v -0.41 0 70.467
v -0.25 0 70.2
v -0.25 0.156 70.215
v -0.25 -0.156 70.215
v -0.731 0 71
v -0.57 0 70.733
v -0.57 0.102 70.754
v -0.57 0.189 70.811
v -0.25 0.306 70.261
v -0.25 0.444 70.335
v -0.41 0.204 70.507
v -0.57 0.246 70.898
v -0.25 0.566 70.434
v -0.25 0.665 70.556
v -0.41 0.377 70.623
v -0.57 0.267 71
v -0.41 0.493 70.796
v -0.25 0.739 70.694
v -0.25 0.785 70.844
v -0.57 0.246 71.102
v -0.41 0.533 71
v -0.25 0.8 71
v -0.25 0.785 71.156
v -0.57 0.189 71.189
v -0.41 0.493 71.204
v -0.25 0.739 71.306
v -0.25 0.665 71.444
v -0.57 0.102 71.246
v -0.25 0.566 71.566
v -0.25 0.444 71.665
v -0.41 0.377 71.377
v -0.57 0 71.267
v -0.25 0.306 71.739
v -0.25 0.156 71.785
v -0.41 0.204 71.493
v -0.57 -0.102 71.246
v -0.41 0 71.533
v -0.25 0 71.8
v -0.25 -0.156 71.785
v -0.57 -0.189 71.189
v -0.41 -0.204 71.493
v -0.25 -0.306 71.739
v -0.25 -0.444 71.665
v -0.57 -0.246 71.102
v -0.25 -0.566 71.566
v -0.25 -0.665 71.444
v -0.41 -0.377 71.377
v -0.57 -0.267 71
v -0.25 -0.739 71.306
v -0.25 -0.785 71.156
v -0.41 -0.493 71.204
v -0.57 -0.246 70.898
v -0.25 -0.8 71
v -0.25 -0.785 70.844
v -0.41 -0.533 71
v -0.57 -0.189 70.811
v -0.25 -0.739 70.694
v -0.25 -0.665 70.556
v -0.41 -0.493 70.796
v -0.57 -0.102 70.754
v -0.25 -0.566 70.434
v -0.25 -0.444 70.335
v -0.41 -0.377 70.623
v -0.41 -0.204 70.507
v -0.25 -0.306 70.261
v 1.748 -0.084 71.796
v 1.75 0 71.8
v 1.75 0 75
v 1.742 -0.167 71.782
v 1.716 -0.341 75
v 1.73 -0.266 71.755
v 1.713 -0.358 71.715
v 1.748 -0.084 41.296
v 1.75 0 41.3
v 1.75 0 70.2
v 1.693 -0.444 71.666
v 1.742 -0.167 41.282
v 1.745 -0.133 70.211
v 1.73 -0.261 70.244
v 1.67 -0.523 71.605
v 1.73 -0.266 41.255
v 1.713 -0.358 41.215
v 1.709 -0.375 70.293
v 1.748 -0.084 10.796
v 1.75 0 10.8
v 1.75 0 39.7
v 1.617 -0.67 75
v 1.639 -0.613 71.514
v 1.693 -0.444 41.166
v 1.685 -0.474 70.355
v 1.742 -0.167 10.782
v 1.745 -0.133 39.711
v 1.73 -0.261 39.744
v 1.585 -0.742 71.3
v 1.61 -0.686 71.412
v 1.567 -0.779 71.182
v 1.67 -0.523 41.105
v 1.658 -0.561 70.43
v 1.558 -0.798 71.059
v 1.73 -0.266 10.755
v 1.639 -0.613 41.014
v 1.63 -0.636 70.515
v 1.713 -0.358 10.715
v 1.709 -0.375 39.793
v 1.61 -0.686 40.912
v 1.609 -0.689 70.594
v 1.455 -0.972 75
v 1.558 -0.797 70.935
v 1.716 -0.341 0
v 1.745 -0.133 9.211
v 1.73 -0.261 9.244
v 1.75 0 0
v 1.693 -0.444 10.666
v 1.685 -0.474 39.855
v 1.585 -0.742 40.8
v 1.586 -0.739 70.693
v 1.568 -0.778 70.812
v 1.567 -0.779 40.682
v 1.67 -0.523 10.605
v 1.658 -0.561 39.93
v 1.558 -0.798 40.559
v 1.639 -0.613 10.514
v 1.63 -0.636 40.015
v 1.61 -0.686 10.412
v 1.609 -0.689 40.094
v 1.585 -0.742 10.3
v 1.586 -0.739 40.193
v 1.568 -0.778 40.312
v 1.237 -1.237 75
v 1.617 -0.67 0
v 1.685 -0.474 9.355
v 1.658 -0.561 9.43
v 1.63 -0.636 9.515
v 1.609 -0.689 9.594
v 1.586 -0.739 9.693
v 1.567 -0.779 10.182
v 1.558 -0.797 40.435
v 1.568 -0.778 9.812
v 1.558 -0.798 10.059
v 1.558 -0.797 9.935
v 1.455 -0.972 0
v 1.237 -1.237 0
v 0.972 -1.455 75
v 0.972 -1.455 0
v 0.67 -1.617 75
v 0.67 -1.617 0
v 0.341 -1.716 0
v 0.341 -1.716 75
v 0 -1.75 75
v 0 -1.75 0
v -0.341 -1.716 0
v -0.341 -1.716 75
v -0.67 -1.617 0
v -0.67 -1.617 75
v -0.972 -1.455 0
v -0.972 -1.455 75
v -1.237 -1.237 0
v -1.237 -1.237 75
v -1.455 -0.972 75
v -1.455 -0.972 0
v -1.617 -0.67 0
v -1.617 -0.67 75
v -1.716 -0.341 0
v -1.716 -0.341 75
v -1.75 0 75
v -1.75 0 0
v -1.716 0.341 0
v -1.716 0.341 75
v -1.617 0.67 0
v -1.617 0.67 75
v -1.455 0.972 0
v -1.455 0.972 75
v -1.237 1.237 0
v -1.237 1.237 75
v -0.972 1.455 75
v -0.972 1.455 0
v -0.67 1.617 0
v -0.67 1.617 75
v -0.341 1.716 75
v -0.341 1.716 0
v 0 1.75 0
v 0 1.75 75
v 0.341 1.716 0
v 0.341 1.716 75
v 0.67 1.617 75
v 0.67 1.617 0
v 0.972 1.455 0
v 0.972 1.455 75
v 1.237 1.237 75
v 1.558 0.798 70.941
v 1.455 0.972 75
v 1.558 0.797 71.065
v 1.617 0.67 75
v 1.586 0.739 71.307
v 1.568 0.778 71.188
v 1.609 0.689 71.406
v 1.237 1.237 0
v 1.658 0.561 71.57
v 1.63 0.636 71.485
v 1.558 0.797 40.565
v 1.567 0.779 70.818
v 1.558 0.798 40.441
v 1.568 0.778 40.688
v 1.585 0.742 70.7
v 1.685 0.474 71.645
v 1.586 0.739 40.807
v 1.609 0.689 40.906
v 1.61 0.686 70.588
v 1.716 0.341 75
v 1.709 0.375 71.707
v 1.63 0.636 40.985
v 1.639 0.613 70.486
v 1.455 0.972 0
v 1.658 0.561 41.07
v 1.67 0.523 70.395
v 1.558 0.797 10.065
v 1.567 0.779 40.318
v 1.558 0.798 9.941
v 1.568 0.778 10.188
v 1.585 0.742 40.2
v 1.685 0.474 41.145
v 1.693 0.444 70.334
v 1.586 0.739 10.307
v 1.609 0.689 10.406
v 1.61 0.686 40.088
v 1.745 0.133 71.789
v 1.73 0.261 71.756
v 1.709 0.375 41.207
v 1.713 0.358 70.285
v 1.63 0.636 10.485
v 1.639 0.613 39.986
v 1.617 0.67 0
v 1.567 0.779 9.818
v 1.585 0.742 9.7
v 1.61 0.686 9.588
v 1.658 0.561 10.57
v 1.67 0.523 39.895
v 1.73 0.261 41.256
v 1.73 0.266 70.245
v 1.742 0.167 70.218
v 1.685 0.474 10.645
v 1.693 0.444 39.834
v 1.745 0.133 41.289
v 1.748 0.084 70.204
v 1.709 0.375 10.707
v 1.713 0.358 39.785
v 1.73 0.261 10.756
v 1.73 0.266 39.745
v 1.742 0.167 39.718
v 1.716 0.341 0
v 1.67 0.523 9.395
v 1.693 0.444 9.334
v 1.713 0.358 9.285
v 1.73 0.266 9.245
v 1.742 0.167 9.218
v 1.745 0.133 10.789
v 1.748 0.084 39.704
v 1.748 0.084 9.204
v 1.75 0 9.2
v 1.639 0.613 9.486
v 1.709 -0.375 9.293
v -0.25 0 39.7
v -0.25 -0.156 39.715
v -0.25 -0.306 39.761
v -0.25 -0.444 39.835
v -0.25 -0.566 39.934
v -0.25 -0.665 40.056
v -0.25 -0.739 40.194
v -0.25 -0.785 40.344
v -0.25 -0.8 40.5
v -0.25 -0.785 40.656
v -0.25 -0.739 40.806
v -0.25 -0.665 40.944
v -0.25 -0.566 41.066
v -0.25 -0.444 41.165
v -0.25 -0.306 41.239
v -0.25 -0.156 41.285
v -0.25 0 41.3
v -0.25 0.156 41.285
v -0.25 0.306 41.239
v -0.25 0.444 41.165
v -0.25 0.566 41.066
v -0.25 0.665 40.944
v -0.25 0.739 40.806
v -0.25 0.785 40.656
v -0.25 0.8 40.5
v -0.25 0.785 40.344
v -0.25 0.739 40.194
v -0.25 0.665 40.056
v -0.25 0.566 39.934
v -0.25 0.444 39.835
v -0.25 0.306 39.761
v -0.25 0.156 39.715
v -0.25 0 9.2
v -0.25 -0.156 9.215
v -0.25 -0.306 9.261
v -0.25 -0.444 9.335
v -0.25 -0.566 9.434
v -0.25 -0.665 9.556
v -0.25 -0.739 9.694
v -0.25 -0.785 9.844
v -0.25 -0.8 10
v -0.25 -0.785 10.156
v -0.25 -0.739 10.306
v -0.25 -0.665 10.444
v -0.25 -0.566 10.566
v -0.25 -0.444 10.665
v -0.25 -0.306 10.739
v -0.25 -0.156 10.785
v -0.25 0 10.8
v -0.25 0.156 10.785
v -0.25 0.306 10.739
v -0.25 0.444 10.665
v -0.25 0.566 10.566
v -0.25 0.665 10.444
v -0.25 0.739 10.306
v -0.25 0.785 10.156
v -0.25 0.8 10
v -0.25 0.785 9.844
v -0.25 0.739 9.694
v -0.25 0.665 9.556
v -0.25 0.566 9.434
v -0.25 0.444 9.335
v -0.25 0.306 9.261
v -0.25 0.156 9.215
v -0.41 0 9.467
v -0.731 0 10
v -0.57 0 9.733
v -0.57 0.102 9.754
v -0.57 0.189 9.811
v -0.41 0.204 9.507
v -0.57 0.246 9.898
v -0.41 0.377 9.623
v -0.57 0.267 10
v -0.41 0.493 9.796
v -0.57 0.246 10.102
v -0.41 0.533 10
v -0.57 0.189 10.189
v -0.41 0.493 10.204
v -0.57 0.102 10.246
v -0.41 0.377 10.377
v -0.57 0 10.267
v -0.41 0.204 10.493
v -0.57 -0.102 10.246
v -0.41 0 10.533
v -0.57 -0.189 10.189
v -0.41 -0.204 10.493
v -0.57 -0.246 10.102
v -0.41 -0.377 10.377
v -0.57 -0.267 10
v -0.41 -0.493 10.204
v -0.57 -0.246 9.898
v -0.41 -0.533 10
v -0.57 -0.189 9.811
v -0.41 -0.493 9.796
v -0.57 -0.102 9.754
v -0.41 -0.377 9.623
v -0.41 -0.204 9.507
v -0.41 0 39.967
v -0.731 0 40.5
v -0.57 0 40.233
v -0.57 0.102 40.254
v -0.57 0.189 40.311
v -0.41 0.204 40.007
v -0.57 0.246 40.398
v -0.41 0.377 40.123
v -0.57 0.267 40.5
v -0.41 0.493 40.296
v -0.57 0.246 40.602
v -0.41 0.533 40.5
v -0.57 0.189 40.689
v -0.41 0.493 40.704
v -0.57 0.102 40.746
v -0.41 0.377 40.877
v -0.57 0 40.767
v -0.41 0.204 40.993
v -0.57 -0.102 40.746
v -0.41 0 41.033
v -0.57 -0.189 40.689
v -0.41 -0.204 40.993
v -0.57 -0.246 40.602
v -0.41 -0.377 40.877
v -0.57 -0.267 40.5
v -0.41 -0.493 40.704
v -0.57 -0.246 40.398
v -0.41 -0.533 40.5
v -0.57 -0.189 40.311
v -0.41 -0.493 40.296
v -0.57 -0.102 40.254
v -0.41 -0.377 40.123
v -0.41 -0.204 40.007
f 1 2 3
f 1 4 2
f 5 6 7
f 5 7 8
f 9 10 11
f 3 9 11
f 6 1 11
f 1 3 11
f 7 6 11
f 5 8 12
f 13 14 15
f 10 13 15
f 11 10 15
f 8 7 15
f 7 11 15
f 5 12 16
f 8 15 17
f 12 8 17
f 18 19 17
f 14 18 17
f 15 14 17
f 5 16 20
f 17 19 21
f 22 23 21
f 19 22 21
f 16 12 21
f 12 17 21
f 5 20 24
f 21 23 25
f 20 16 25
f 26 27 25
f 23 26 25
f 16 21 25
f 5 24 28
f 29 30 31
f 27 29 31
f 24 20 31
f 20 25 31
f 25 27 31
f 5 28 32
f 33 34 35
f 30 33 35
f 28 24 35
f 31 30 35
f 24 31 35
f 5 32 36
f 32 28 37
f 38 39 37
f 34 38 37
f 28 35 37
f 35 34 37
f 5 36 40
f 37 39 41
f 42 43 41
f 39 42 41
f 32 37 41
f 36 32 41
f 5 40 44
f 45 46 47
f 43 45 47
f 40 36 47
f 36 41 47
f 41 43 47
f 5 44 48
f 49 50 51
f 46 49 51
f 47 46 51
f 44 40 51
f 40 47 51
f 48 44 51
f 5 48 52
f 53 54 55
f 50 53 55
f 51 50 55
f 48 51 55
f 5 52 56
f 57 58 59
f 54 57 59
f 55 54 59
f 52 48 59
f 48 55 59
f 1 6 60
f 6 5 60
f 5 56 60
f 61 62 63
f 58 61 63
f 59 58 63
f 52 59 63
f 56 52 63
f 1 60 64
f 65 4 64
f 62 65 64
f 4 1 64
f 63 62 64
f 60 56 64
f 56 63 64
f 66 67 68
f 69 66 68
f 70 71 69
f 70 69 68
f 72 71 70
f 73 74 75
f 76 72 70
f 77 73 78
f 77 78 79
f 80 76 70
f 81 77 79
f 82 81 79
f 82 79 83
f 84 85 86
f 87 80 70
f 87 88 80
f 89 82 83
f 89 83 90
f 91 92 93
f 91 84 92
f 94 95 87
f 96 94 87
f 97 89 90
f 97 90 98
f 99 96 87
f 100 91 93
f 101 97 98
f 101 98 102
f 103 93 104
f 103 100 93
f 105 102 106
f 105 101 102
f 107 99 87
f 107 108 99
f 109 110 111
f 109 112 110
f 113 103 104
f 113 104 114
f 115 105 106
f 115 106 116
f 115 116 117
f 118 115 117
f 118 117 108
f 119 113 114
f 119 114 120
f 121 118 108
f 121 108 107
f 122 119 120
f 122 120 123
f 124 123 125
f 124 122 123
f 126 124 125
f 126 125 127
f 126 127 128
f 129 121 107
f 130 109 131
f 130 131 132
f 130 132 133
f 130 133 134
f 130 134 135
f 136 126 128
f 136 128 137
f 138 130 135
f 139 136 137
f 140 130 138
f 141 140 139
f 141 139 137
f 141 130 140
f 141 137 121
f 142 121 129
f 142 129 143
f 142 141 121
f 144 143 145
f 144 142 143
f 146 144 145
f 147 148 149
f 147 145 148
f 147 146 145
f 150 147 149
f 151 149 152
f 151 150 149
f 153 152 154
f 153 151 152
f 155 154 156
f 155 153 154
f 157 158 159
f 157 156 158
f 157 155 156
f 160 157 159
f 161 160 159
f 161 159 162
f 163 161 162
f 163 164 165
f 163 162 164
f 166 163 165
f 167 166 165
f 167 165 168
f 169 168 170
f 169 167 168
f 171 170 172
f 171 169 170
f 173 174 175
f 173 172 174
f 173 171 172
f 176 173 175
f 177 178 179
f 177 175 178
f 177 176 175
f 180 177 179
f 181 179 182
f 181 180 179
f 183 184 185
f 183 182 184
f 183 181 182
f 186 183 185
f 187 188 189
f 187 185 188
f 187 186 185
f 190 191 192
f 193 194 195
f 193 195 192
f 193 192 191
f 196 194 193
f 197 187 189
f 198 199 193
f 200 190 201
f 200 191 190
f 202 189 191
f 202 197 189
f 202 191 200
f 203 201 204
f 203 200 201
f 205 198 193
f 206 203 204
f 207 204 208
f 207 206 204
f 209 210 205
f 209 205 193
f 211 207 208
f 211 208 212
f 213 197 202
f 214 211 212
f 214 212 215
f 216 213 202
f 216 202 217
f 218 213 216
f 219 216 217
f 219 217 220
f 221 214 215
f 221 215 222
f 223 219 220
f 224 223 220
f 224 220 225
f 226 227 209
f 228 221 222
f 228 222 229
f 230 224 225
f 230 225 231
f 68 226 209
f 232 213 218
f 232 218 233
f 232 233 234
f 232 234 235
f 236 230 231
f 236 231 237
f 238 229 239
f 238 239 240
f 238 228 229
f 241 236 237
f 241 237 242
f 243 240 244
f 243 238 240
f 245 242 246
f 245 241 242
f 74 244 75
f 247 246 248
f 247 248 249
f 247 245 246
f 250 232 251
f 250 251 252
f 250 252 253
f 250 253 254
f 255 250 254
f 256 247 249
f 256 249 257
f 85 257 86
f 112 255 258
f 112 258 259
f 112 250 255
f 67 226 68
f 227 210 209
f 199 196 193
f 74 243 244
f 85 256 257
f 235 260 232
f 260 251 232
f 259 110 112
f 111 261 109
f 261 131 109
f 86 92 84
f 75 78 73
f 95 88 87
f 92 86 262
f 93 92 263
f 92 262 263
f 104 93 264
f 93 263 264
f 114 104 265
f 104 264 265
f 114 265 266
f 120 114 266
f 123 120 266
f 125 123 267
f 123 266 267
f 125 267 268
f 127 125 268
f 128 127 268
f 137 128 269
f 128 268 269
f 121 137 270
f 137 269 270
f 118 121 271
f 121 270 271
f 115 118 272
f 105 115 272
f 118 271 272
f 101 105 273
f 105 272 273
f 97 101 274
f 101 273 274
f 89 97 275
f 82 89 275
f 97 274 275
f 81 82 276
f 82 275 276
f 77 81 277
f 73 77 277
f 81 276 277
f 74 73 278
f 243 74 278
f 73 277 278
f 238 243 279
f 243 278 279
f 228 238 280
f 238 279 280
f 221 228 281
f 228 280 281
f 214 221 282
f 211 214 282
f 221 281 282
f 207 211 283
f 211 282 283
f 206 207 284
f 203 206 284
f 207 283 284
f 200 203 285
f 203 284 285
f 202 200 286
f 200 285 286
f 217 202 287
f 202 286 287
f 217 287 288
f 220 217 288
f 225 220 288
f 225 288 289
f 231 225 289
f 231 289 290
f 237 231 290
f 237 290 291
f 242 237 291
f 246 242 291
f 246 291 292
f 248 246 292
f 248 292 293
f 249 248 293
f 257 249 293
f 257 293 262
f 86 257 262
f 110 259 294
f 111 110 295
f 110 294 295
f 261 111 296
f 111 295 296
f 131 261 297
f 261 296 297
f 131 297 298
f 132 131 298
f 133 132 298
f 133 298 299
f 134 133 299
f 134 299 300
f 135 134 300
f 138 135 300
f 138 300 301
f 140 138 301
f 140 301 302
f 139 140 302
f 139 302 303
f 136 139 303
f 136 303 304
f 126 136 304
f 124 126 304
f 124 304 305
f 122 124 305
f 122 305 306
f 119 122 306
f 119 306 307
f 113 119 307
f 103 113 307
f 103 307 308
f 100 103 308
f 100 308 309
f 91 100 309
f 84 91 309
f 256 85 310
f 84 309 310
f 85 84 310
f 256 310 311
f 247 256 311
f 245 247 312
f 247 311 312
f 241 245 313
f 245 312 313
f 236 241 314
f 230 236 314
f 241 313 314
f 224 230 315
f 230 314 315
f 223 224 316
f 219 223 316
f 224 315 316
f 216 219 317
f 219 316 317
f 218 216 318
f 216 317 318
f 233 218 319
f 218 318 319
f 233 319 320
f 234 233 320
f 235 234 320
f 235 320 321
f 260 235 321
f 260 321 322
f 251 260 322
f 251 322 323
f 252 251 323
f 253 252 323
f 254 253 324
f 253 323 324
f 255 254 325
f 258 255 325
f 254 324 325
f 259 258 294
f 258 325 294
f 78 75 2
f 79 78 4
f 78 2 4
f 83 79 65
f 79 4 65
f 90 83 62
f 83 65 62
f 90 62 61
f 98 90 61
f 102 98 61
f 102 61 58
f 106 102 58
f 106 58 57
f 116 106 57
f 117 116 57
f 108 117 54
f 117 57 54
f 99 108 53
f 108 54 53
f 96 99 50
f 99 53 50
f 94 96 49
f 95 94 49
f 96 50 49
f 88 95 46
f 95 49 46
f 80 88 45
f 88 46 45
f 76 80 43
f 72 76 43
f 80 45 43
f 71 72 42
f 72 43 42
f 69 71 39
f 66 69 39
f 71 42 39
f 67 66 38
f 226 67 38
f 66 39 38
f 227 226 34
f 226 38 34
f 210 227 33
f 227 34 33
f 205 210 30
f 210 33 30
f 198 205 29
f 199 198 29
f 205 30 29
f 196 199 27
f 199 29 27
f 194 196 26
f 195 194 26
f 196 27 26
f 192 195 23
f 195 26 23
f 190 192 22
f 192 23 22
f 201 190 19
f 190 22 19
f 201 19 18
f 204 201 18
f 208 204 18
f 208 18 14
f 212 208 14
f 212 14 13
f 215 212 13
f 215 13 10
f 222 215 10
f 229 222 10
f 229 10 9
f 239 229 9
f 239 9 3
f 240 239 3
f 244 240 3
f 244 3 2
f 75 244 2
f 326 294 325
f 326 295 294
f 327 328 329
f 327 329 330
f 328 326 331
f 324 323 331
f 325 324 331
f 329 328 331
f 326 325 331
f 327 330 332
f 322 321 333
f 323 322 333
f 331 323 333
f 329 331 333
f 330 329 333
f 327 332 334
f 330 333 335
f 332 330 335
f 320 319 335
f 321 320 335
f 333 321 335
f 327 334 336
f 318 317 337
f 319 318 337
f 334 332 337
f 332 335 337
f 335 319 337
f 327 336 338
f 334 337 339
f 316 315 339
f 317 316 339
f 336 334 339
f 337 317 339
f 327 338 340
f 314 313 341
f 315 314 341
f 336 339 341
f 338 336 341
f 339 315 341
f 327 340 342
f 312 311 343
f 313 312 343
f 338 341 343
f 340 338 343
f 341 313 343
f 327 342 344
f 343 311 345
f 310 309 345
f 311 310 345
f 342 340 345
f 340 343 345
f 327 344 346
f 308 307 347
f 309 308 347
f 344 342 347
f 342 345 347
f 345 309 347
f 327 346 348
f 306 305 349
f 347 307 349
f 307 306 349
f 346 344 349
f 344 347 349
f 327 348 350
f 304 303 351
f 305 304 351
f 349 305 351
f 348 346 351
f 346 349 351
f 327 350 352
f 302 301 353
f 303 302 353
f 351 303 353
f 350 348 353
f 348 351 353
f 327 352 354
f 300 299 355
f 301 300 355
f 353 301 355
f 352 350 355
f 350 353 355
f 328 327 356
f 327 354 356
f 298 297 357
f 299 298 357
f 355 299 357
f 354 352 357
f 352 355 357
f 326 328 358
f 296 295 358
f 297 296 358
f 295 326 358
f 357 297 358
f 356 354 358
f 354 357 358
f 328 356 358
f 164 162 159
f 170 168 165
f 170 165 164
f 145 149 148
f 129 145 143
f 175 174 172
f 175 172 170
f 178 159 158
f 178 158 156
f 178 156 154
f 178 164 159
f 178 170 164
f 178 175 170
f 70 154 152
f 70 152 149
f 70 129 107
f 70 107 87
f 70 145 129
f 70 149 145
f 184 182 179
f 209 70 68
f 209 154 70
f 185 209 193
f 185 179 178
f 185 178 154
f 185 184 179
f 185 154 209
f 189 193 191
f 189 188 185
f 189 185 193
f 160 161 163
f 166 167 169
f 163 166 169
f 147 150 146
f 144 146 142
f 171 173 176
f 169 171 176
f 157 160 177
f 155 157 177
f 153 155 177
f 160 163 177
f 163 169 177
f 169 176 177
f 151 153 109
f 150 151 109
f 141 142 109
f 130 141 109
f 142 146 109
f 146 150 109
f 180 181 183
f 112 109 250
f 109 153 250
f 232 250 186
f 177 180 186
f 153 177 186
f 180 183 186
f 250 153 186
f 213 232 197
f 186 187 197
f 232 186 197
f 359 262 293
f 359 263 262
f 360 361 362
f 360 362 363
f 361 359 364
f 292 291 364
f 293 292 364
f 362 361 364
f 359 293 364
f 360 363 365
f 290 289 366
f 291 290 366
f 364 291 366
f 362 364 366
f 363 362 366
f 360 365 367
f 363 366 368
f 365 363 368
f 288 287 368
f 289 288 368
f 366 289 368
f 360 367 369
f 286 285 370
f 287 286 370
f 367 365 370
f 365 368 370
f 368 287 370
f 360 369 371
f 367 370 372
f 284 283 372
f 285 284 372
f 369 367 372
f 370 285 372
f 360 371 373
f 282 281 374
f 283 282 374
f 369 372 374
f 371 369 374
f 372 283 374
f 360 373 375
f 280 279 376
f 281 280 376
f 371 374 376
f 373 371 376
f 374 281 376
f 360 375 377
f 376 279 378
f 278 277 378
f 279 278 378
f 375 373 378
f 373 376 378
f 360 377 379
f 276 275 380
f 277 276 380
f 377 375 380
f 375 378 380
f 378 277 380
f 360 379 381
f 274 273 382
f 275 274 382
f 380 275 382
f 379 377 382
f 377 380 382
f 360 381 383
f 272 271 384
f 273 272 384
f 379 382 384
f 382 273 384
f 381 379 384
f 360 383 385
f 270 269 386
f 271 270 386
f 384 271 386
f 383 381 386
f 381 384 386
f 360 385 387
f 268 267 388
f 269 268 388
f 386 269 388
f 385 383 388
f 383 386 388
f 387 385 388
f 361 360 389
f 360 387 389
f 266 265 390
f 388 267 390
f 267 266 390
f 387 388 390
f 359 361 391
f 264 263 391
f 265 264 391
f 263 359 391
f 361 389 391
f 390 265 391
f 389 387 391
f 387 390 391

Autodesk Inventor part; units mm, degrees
ref_plane "XZ Plane" through (0, 0, 0) normal (0, 1, 0) x (-1, 0, 0)
ref_plane "XY Plane" through (0, 0, 0) normal (0, 0, 1) x (1, 0, 0)
sketch "Skizze1" plane through (0, 0, 0) normal (0, 0, 1) x (1, 0, 0)
  circle A0 centre (0, 0) radius 1.75
  dimension "d0" = 3.5
extrude "Extrusion1" add sketch "Skizze1" along normal blind 75
ref_plane "Arbeitsebene2" through (1.75, 0, 0) normal (1, 0, 0) x (0, 1, 0)
sketch "Skizze8" plane through (1.75, 0, 0) normal (1, 0, 0) x (0, 1, 0)
  line L0 (0, 0) -> (0, 10) construction
  line L1 (0, 10) -> (0, 40.5) construction
  line L2 (0, 40.5) -> (0, 71) construction
  dimension "d14" = 10
  dimension "d15" = 30.5
  dimension "d16" = 30.5
hole "Bohrung2" at (1.75, 0, 10) at (1.75, 0, 40.5) at (1.75, 0, 71) at (1.75, 0, 10) at (1.75, 0, 40.5) at (1.75, 0, 71) direction (-1, 0, 0) diameter 1.6 depth 2 tip angle 118 clearance for "Flachkopfmaschinenschraube (82)" size "#0" standard "ANSI UST"
properties part number "cu_stange"
